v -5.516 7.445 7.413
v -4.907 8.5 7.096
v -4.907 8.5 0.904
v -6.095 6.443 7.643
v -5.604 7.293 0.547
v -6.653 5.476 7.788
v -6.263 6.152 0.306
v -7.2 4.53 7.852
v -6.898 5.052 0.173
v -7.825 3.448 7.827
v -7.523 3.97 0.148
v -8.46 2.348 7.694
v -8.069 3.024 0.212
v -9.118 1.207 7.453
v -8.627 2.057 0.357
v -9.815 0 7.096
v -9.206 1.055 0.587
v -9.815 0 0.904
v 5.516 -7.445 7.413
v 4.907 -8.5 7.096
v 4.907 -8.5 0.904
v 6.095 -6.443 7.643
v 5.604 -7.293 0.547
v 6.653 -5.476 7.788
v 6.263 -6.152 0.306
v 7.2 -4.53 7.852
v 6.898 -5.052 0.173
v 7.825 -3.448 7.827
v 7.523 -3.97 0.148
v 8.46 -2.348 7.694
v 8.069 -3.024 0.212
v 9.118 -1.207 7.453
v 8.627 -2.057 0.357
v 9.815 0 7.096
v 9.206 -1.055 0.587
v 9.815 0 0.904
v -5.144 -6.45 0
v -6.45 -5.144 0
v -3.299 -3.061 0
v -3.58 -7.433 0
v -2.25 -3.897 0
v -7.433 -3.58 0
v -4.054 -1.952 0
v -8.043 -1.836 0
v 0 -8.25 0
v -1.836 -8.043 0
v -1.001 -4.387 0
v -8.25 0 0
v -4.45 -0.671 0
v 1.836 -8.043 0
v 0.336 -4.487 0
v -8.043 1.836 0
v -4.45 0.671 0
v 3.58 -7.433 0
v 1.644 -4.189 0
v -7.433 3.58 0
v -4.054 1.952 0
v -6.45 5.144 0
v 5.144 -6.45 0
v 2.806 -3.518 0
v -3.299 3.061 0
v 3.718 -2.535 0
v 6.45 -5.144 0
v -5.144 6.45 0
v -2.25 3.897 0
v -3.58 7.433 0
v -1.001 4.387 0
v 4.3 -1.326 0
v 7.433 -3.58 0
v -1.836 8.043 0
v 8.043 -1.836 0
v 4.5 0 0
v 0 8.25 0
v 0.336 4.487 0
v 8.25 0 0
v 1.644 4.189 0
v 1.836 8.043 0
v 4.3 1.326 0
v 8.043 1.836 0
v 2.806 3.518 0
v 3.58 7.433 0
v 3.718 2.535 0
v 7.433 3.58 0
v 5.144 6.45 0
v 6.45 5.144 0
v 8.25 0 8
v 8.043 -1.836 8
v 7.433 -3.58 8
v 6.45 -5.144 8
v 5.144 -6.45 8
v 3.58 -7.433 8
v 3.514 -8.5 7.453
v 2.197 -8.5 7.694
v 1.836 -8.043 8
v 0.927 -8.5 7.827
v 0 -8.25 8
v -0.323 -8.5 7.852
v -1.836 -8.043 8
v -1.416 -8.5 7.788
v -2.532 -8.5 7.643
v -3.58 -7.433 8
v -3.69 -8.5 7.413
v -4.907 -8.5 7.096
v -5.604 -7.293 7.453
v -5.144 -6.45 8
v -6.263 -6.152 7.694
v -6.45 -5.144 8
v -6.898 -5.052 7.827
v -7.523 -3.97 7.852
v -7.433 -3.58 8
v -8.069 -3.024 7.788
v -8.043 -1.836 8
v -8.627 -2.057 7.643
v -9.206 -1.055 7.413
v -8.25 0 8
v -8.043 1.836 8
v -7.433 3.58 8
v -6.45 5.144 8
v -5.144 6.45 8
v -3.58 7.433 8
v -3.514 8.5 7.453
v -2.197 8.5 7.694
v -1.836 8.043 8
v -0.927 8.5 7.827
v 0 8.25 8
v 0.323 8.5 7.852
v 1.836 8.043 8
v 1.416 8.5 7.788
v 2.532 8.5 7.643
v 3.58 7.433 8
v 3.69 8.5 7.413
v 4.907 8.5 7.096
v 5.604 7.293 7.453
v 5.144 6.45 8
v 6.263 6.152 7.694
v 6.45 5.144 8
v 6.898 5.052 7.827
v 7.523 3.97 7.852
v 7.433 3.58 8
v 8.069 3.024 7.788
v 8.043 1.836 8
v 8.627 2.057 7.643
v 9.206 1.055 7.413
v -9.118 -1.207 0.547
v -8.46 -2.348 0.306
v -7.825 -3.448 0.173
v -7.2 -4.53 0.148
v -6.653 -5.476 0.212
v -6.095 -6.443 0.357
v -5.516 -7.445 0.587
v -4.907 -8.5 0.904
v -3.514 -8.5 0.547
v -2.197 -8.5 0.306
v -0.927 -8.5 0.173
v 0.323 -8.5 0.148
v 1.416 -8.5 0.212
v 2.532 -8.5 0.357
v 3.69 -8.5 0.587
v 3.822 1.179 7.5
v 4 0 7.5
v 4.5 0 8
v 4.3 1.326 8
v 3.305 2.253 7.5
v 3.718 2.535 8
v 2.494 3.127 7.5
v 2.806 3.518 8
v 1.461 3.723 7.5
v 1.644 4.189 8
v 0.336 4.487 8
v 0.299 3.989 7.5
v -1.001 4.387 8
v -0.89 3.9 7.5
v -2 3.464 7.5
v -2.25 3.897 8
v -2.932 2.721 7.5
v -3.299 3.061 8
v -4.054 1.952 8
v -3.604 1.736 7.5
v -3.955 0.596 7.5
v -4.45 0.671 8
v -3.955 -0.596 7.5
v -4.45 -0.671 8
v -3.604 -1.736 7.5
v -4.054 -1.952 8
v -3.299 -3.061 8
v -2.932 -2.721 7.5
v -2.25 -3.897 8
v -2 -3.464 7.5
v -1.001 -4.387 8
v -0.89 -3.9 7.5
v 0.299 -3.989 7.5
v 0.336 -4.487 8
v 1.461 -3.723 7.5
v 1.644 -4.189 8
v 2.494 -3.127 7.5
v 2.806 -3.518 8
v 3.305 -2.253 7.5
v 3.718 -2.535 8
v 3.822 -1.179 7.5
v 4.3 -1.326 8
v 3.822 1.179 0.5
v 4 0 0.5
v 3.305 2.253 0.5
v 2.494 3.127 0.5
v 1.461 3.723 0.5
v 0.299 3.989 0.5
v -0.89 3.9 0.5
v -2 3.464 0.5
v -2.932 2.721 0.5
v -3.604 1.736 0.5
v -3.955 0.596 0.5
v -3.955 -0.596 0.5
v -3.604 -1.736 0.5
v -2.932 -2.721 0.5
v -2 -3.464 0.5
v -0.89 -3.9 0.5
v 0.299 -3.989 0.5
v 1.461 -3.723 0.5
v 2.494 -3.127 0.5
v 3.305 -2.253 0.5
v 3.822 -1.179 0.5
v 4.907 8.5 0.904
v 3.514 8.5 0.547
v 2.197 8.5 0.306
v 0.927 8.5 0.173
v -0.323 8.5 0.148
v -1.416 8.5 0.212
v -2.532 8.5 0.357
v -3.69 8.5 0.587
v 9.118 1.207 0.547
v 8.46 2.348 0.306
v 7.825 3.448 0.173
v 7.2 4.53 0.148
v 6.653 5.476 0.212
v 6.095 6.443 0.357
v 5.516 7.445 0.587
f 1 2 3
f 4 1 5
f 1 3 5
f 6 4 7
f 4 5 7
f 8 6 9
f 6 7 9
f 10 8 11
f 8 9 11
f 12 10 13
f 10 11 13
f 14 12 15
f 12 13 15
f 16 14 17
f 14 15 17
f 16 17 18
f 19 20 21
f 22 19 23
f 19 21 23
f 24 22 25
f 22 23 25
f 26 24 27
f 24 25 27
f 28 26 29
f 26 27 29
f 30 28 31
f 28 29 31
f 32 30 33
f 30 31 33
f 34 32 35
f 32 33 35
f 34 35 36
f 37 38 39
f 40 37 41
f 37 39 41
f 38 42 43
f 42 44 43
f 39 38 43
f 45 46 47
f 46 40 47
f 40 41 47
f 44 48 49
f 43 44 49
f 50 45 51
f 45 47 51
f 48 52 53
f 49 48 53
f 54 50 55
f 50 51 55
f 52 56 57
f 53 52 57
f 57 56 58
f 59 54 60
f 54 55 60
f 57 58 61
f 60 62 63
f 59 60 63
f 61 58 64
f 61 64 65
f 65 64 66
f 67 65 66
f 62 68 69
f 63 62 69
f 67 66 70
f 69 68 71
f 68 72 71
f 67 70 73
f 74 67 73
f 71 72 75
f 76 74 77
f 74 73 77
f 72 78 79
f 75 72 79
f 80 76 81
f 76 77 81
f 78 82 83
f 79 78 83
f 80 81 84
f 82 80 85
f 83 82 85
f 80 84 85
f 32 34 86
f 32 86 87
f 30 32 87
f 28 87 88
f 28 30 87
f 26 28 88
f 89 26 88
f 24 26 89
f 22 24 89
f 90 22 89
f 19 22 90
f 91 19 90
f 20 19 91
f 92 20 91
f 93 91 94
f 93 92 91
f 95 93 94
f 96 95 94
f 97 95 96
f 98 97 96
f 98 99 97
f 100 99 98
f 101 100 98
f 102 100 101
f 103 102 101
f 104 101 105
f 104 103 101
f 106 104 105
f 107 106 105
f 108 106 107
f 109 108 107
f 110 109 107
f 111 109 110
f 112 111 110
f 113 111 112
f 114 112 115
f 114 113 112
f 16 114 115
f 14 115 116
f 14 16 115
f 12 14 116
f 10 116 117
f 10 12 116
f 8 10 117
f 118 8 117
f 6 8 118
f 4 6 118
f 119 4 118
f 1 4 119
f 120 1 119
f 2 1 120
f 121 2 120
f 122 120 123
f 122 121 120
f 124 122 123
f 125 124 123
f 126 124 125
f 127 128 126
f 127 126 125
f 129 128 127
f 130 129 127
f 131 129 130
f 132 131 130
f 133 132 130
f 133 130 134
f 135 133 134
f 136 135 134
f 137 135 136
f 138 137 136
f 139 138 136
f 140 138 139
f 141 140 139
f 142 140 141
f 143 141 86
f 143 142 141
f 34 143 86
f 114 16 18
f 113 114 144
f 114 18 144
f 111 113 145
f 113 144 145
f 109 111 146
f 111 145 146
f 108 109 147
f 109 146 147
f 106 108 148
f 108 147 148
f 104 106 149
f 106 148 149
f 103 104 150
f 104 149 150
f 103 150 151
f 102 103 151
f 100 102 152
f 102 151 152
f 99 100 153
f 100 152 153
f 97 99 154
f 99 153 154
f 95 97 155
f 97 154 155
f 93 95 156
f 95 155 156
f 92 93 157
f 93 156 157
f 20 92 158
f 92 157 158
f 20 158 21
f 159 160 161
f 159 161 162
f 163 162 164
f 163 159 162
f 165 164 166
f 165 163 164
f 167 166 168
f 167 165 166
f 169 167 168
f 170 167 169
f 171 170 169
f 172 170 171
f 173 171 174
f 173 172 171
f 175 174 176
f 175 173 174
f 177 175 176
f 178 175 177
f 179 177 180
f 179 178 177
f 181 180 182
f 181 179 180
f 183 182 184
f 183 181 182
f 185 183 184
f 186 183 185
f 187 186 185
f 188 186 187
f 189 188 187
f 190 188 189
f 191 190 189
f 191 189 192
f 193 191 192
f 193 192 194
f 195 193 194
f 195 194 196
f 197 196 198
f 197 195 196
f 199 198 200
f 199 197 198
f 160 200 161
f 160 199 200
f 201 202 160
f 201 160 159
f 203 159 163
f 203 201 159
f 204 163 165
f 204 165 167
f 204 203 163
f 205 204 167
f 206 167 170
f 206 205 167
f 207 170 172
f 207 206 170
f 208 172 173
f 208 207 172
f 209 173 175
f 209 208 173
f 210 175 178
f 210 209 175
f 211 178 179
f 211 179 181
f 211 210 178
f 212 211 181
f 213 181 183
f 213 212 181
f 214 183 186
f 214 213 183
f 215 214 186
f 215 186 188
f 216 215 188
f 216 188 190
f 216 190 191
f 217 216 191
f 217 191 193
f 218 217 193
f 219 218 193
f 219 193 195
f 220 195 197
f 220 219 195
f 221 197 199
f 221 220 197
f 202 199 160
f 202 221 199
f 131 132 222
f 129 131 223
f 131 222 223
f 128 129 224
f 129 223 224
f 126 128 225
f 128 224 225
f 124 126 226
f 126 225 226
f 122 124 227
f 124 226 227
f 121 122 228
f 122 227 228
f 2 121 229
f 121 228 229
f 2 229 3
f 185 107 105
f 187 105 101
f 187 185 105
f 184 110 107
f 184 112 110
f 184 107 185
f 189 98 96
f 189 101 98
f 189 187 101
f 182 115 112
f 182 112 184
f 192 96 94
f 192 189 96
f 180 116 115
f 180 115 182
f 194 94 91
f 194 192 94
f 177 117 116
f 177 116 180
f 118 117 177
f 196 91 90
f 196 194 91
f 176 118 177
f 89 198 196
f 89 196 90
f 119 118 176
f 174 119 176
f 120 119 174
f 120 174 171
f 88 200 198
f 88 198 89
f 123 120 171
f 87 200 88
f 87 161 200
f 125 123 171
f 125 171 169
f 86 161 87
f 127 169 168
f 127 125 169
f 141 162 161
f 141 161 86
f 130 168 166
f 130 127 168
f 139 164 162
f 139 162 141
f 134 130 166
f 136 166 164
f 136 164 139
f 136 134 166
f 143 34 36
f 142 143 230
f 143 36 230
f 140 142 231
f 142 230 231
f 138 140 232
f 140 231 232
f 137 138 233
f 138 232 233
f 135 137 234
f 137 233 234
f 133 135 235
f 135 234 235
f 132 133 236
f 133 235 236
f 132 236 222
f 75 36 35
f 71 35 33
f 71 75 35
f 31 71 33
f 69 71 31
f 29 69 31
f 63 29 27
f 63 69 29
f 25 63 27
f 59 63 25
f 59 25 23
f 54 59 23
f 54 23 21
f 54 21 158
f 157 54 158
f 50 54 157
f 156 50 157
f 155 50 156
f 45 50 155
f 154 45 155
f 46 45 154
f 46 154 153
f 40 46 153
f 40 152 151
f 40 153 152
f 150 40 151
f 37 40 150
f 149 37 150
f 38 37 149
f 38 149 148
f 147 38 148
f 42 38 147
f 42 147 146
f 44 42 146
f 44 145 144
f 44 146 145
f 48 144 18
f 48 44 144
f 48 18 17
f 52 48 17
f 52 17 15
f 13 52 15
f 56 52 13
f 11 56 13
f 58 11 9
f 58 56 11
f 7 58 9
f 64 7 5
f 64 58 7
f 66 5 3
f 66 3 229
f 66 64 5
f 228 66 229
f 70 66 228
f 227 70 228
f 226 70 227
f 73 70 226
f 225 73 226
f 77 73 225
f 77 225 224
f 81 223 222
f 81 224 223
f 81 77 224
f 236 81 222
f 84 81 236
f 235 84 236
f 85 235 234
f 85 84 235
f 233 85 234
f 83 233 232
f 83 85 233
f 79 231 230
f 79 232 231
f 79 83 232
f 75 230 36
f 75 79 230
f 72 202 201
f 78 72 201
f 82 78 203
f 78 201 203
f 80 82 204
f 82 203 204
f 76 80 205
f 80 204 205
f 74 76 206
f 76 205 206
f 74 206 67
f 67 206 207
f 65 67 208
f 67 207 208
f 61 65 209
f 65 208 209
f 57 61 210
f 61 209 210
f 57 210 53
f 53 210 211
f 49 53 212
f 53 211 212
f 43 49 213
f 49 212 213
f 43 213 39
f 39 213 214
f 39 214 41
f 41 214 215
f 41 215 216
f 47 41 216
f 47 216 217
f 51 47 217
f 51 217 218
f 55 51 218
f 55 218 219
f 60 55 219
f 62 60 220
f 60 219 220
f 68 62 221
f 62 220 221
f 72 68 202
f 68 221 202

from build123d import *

# Parameters (mm, degrees)
F0_R     = 4
F1_DEPTH = 8
F4_SIZE  = 0.5


# Not quite as in the source:
# - a feature of the source that left no trace in its solid (it failed there, or was rolled back) is left out


with BuildPart() as f1:
    # F0 (on Top) → F1 (new body)
    with BuildSketch(Plane.XY):
        Polygon((4.9074772881, -8.5), (9.8149545762, 0), (4.9074772881, 8.5), (-4.9074772881, 8.5), (-9.8149545762, 0), (-4.9074772881, -8.5), align=None)
        Circle(F0_R, mode=Mode.SUBTRACT)
    extrude(amount=F1_DEPTH)

    # F2 (on Front) → F3 (revolve, cut)
    with BuildSketch(Plane.XZ):
        Polygon((12.4901464933, 8), (8.25, 8), (12.4901464933, 5.5519502807), align=None)
        Polygon((12.4901464933, 2.4480497193), (8.25, 0), (12.4901464933, 0), align=None)
    revolve(axis=Axis((0, 0, 3.4472336993), (0, 0, -1)), mode=Mode.SUBTRACT)

    # F4
    f4_edges = [f1.edges().sort_by_distance(p)[0] for p in [
        (-4, 0, 8),
        (-4, 0, 0),
    ]]
    chamfer(f4_edges, length=F4_SIZE)


solid = f1.part
